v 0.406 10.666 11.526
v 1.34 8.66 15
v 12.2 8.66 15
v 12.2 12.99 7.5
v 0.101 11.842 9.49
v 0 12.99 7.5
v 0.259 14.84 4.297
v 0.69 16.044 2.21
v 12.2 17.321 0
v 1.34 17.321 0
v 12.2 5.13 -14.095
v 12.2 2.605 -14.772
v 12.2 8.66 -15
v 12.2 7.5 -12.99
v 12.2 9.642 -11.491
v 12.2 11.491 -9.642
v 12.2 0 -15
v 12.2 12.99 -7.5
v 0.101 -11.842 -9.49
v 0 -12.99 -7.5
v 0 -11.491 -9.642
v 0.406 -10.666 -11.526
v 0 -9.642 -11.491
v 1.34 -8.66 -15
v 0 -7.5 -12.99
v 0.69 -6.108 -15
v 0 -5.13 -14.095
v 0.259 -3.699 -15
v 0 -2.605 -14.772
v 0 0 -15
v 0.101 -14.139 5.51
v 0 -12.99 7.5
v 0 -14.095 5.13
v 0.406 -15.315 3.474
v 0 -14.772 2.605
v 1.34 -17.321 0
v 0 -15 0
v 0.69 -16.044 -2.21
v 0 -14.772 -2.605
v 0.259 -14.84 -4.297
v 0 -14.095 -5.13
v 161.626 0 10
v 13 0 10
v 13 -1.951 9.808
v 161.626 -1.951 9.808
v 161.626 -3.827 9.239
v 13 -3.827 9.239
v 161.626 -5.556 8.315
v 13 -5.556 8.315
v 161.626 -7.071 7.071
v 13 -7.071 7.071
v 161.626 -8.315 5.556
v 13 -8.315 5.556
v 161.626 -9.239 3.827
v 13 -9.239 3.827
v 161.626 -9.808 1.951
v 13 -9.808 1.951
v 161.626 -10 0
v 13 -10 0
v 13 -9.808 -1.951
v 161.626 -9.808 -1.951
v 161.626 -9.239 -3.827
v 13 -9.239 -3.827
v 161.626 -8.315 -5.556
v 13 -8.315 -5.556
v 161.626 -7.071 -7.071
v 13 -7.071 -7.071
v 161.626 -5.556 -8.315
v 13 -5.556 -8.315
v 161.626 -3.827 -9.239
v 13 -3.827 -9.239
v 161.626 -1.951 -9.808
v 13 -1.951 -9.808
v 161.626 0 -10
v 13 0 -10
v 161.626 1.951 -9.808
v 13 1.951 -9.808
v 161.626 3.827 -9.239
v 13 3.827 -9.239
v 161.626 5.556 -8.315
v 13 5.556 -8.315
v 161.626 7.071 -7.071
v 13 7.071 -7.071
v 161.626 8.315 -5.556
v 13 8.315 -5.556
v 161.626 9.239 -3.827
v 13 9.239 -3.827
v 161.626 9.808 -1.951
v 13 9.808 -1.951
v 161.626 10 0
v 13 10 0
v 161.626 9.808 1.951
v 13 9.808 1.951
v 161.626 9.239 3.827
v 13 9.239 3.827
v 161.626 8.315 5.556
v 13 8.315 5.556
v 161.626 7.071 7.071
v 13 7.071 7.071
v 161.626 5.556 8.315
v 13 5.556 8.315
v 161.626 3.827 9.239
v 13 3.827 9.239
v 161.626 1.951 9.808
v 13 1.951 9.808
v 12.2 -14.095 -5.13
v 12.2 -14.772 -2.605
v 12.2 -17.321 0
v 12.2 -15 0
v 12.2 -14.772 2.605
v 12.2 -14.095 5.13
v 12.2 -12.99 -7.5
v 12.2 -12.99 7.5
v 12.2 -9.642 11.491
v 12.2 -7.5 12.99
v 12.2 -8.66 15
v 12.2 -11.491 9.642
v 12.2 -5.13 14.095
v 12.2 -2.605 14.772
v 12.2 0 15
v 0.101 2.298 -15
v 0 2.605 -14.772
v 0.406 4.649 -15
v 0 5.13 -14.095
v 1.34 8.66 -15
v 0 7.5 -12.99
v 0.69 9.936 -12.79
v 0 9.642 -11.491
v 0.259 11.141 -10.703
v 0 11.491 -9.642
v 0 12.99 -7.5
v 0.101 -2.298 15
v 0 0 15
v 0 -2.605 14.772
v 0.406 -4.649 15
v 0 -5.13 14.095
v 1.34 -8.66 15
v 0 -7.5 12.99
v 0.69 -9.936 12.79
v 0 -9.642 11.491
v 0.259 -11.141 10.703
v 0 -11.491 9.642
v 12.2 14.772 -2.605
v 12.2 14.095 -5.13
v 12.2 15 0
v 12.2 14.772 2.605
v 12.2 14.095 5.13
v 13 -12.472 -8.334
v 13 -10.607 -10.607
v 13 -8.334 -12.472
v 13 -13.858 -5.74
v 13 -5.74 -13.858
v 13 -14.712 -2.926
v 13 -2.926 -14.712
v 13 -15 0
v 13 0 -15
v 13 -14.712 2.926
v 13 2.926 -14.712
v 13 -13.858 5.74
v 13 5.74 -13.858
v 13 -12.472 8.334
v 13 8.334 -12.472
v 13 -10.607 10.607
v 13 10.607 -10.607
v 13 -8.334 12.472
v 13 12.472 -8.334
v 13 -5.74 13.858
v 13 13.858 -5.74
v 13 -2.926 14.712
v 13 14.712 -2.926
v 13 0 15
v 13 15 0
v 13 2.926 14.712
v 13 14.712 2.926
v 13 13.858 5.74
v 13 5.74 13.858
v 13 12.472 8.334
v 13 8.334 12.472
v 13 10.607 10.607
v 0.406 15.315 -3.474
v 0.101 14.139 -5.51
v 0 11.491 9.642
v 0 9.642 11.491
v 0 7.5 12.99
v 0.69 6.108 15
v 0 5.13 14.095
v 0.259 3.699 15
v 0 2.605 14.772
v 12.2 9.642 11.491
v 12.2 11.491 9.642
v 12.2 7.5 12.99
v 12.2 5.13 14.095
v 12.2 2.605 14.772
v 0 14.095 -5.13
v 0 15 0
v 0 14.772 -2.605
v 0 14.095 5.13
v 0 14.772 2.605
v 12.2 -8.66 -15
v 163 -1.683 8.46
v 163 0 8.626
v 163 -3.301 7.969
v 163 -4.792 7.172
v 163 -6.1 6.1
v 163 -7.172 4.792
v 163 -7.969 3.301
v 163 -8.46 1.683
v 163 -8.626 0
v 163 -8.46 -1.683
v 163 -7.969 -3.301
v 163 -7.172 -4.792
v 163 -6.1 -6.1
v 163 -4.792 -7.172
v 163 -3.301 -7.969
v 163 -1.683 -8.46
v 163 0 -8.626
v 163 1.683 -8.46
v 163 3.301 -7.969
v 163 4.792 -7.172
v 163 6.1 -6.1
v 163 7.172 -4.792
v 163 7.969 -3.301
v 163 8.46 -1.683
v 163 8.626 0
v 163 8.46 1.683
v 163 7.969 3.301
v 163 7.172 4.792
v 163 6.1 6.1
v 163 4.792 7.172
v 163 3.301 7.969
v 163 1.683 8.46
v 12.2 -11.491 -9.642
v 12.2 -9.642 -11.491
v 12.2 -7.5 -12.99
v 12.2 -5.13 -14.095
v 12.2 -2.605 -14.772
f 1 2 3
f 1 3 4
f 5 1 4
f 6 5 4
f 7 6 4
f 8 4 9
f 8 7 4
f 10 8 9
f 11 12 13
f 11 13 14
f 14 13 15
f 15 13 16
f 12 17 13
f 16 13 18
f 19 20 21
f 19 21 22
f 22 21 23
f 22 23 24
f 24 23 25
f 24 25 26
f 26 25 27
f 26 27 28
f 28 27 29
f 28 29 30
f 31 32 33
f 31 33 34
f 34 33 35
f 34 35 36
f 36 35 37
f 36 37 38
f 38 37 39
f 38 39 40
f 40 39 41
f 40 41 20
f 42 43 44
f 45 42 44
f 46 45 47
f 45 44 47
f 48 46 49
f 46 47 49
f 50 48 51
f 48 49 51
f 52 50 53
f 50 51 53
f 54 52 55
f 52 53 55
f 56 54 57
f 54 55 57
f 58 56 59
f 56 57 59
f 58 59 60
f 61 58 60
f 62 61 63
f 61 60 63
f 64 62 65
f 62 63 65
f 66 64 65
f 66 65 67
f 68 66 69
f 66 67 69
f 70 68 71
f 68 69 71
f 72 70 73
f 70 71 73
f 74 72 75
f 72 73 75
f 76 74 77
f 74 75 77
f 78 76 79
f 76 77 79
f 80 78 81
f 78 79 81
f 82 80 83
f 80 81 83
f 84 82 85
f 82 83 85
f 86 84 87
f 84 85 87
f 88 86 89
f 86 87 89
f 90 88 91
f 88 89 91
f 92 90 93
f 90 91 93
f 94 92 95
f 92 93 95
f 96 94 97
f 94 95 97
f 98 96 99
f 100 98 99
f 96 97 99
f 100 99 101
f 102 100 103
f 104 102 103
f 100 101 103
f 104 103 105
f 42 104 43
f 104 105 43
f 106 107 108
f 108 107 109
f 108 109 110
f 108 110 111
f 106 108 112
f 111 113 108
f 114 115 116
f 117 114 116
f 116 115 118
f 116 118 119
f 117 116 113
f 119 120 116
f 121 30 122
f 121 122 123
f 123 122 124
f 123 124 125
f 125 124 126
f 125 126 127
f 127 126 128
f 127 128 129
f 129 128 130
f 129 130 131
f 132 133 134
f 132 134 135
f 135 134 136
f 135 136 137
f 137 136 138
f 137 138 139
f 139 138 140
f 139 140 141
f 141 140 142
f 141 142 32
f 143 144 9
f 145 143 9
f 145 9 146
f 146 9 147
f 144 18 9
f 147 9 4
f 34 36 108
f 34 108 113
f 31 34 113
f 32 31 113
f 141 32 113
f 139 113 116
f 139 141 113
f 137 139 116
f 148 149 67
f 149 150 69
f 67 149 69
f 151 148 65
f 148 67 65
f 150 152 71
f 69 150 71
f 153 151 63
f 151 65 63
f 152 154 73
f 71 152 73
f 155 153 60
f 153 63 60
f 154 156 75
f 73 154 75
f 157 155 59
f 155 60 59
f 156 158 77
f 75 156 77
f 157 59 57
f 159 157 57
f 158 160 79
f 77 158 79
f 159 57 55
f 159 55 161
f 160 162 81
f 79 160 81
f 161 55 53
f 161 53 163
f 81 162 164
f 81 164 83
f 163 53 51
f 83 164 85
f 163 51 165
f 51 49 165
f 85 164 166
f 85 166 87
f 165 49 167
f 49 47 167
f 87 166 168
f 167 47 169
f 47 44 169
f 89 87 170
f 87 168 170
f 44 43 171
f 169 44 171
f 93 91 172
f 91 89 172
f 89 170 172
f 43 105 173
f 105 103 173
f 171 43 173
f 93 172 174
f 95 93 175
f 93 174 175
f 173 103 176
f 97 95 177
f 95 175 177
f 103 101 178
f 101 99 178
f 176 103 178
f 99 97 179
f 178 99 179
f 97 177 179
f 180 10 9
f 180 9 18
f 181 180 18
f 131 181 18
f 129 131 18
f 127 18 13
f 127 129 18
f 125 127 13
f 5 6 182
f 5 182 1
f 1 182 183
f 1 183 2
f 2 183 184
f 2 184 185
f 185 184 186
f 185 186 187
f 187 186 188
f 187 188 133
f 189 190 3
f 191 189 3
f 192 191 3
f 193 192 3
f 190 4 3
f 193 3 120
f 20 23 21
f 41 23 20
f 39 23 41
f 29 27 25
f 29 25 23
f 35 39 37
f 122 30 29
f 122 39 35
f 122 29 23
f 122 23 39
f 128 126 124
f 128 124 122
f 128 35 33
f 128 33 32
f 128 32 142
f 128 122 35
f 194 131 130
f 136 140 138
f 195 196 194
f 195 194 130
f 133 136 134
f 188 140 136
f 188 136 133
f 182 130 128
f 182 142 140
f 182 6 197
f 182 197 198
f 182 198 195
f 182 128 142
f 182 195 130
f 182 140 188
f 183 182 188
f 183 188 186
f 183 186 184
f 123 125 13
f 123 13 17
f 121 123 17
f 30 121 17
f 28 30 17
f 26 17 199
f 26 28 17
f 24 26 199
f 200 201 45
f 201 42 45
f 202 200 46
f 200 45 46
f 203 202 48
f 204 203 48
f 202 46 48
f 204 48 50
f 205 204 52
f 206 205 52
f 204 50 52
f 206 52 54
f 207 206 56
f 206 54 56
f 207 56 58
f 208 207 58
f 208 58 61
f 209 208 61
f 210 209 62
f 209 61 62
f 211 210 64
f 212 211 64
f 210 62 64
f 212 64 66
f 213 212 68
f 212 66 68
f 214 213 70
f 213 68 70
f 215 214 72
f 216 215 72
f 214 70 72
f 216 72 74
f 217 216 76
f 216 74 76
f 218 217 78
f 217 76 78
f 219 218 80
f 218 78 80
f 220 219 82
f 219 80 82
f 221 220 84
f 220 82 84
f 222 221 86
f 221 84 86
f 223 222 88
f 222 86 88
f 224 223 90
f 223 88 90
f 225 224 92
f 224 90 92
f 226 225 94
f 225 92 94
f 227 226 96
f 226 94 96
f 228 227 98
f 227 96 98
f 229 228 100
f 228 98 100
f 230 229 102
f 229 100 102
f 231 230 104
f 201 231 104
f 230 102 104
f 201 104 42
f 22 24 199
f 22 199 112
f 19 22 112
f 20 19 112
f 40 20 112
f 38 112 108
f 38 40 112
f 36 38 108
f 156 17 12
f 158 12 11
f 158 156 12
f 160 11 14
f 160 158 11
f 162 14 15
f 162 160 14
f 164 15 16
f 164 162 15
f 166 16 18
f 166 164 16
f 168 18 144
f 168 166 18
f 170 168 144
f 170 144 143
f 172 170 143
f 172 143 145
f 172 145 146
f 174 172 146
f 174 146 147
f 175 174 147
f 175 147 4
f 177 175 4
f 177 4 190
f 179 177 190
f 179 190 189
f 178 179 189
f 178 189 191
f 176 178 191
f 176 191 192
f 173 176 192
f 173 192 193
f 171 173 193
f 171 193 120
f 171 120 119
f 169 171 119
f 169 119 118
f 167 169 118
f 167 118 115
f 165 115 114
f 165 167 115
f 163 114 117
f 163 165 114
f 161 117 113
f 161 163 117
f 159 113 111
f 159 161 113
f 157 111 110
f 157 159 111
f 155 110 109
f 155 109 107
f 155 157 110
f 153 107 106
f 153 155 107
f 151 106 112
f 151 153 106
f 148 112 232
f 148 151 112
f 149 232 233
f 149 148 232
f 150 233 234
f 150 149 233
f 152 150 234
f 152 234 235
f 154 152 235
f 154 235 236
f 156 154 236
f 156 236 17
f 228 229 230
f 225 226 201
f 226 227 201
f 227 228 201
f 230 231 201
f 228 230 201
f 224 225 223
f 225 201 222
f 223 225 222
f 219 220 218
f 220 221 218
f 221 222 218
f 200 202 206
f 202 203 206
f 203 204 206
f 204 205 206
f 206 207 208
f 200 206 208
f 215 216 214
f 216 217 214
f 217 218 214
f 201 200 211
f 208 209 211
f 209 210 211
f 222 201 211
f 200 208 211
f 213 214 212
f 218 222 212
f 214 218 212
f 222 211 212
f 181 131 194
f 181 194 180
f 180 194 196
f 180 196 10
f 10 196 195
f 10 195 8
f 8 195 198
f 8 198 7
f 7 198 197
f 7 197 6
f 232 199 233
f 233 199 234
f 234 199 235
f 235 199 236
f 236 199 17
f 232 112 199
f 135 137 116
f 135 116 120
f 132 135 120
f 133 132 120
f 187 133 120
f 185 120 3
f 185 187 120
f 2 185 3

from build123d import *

# Parameters (mm, degrees)
BASEHEAD_DEPTH = 13
BEARINGSKE_W   = 0.8
BEARINGSKE_H   = 2.320508076


with BuildPart() as part:
    # HeadSke → BaseHead (new body)
    with BuildSketch(Plane(origin=(0, 0, 0), x_dir=(0, 0, -1), z_dir=(1, 0, 0))):
        Polygon((15, 8.660254038), (15, -8.660254038), (0, -17.320508076), (-15, -8.660254038), (-15, 8.660254038), (0, 17.320508076), align=None)
    extrude(amount=BASEHEAD_DEPTH)

    # BodySke → BaseBody (revolve)
    with BuildSketch(Plane.XY, mode=Mode.PRIVATE) as basebody_sk:
        Polygon((0, 0), (163, 0), (163, 8.626), (161.626, 10), (0, 10), align=None)
    revolve(basebody_sk.sketch.rotate(Axis((0, 0, 0), (1, 0, 0)), 90), axis=Axis((0, 0, 0), (1, 0, 0)))

    # Sketch3 → HeadChamfer (revolve, cut)
    with BuildSketch(Plane(origin=(0, 0, 0), x_dir=(1, 0, 0), z_dir=(0, 1, 0))):
        Polygon((3.75, 21.495190528), (-3.75, 8.504809472), (-15.804766255, 15.464632014), (-8.304766255, 28.455013071), align=None)
    revolve(axis=Axis((0, 0, 0), (1, 0, 0)), mode=Mode.SUBTRACT)

    # BearingSke → BearingFace (revolve, cut)
    with BuildSketch(Plane.XY, mode=Mode.PRIVATE) as bearingface_sk:
        with Locations((12.6, 16.160254038)):
            Rectangle(BEARINGSKE_W, BEARINGSKE_H)
    revolve(bearingface_sk.sketch.rotate(Axis((0, 0, 0), (1, 0, 0)), 270), axis=Axis((0, 0, 0), (1, 0, 0)), mode=Mode.SUBTRACT)


solid = part.part
